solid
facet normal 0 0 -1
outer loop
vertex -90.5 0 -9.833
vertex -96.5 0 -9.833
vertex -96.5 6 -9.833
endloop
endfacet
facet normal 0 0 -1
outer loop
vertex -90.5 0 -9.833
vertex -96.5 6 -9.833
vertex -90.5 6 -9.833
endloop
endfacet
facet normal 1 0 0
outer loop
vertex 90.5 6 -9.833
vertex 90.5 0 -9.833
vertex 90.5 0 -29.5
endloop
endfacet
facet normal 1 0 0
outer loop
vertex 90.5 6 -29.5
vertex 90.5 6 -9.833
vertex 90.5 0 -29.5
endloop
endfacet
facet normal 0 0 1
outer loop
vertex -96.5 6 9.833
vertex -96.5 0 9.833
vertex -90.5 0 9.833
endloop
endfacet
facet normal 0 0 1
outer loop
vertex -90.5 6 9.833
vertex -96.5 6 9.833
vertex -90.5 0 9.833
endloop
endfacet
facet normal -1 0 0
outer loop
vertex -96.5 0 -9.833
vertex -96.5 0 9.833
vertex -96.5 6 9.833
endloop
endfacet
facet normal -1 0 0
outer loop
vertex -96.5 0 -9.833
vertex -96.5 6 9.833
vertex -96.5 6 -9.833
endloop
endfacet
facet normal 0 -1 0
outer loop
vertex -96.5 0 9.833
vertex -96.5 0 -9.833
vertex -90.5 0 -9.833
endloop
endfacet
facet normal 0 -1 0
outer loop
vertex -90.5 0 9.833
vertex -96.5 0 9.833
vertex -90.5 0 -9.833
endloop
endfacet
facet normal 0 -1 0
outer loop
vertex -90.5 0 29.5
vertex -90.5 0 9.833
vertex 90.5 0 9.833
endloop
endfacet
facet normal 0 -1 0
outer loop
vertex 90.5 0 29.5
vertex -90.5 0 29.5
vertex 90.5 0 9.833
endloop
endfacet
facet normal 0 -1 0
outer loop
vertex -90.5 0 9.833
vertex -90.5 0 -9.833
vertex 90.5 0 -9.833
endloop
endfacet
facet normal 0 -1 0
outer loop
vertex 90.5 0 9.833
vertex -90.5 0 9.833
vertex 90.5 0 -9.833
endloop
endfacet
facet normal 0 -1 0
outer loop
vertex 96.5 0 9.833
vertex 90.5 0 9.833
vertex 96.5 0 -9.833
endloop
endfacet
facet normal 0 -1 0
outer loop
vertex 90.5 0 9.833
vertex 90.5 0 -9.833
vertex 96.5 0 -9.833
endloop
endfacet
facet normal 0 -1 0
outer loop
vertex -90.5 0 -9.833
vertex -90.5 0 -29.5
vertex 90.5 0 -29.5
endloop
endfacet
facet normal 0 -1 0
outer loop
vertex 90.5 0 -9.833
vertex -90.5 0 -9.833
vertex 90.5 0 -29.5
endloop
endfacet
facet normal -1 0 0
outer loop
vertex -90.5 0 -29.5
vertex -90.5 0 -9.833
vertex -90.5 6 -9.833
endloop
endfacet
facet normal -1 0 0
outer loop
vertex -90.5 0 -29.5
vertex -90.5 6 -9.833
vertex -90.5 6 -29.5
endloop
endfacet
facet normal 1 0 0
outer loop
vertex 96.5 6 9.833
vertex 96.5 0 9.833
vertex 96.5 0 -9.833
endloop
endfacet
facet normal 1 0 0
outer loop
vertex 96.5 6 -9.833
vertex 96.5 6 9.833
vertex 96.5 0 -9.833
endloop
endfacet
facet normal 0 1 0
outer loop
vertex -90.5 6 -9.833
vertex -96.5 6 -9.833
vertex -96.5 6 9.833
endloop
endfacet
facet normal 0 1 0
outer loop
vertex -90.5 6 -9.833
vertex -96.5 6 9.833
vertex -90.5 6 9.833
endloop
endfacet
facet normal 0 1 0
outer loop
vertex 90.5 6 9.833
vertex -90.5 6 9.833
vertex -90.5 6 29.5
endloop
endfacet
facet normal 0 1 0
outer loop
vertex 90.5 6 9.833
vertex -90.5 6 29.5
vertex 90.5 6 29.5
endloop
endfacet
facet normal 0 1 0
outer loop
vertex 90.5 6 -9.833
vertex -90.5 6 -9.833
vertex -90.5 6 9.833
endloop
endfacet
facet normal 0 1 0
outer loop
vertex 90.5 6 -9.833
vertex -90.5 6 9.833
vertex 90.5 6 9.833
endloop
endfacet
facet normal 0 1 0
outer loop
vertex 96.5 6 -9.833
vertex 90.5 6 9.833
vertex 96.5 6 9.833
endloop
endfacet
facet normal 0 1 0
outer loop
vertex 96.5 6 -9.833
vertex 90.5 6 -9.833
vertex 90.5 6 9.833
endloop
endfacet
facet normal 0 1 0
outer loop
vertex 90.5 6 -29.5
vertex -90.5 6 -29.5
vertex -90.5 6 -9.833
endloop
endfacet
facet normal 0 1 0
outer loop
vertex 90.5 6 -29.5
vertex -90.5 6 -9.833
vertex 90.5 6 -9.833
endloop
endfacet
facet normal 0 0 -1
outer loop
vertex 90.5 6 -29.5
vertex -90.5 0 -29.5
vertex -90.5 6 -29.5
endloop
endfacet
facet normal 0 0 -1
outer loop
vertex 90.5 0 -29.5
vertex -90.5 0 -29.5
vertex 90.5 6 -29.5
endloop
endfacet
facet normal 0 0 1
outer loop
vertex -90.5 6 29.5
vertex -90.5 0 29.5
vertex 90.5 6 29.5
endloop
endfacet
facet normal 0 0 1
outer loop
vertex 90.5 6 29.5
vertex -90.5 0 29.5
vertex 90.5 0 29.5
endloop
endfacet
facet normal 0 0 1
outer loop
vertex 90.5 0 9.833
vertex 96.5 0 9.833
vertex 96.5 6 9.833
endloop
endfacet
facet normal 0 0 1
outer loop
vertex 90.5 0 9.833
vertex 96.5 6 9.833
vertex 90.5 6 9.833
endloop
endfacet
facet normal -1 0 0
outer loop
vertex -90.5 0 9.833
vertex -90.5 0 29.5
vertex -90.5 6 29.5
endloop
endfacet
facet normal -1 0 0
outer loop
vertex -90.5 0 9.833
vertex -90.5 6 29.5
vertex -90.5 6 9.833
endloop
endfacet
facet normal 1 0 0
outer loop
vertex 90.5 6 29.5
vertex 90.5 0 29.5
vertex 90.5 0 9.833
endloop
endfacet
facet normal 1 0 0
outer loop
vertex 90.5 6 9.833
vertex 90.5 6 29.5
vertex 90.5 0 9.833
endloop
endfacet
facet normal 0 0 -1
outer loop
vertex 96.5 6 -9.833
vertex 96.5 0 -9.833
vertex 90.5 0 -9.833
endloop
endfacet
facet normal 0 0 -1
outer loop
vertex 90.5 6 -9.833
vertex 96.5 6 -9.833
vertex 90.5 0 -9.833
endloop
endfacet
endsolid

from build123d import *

# Parameters (mm, degrees)
SKETCH1_W           = 193
SKETCH1_H           = 59
BOSS_EXTRUDE1_DEPTH = 6
SKETCH1_3_W         = 6
SKETCH1_3_H         = 19.666666667
CUT_EXTRUDE1_DEPTH  = 7


with BuildPart() as part:
    # Sketch1 → Boss-Extrude1 (new body)
    with BuildSketch(Plane(origin=(0, 0, 0), x_dir=(1, 0, 0), z_dir=(0, 1, 0))):
        Rectangle(SKETCH1_W, SKETCH1_H)
    extrude(amount=BOSS_EXTRUDE1_DEPTH)

    # Sketch1<3> → Cut-Extrude1 (cut, through all)
    with BuildSketch(Plane(origin=(0, 0, 0), x_dir=(1, 0, 0), z_dir=(0, 1, 0))):
        with Locations((-93.5, -19.666666667)):
            Rectangle(SKETCH1_3_W, SKETCH1_3_H)
        with Locations((-93.5, 19.666666667)):
            Rectangle(SKETCH1_3_W, SKETCH1_3_H)
    cut_extrude1 = extrude(amount=CUT_EXTRUDE1_DEPTH, mode=Mode.SUBTRACT)

    # Mirror1: Cut-Extrude1 across plane
    add(cut_extrude1.mirror(Plane(origin=(0, 0, 0), x_dir=(0, 0, 1), z_dir=(1, 0, 0))), mode=Mode.SUBTRACT)


solid = part.part
